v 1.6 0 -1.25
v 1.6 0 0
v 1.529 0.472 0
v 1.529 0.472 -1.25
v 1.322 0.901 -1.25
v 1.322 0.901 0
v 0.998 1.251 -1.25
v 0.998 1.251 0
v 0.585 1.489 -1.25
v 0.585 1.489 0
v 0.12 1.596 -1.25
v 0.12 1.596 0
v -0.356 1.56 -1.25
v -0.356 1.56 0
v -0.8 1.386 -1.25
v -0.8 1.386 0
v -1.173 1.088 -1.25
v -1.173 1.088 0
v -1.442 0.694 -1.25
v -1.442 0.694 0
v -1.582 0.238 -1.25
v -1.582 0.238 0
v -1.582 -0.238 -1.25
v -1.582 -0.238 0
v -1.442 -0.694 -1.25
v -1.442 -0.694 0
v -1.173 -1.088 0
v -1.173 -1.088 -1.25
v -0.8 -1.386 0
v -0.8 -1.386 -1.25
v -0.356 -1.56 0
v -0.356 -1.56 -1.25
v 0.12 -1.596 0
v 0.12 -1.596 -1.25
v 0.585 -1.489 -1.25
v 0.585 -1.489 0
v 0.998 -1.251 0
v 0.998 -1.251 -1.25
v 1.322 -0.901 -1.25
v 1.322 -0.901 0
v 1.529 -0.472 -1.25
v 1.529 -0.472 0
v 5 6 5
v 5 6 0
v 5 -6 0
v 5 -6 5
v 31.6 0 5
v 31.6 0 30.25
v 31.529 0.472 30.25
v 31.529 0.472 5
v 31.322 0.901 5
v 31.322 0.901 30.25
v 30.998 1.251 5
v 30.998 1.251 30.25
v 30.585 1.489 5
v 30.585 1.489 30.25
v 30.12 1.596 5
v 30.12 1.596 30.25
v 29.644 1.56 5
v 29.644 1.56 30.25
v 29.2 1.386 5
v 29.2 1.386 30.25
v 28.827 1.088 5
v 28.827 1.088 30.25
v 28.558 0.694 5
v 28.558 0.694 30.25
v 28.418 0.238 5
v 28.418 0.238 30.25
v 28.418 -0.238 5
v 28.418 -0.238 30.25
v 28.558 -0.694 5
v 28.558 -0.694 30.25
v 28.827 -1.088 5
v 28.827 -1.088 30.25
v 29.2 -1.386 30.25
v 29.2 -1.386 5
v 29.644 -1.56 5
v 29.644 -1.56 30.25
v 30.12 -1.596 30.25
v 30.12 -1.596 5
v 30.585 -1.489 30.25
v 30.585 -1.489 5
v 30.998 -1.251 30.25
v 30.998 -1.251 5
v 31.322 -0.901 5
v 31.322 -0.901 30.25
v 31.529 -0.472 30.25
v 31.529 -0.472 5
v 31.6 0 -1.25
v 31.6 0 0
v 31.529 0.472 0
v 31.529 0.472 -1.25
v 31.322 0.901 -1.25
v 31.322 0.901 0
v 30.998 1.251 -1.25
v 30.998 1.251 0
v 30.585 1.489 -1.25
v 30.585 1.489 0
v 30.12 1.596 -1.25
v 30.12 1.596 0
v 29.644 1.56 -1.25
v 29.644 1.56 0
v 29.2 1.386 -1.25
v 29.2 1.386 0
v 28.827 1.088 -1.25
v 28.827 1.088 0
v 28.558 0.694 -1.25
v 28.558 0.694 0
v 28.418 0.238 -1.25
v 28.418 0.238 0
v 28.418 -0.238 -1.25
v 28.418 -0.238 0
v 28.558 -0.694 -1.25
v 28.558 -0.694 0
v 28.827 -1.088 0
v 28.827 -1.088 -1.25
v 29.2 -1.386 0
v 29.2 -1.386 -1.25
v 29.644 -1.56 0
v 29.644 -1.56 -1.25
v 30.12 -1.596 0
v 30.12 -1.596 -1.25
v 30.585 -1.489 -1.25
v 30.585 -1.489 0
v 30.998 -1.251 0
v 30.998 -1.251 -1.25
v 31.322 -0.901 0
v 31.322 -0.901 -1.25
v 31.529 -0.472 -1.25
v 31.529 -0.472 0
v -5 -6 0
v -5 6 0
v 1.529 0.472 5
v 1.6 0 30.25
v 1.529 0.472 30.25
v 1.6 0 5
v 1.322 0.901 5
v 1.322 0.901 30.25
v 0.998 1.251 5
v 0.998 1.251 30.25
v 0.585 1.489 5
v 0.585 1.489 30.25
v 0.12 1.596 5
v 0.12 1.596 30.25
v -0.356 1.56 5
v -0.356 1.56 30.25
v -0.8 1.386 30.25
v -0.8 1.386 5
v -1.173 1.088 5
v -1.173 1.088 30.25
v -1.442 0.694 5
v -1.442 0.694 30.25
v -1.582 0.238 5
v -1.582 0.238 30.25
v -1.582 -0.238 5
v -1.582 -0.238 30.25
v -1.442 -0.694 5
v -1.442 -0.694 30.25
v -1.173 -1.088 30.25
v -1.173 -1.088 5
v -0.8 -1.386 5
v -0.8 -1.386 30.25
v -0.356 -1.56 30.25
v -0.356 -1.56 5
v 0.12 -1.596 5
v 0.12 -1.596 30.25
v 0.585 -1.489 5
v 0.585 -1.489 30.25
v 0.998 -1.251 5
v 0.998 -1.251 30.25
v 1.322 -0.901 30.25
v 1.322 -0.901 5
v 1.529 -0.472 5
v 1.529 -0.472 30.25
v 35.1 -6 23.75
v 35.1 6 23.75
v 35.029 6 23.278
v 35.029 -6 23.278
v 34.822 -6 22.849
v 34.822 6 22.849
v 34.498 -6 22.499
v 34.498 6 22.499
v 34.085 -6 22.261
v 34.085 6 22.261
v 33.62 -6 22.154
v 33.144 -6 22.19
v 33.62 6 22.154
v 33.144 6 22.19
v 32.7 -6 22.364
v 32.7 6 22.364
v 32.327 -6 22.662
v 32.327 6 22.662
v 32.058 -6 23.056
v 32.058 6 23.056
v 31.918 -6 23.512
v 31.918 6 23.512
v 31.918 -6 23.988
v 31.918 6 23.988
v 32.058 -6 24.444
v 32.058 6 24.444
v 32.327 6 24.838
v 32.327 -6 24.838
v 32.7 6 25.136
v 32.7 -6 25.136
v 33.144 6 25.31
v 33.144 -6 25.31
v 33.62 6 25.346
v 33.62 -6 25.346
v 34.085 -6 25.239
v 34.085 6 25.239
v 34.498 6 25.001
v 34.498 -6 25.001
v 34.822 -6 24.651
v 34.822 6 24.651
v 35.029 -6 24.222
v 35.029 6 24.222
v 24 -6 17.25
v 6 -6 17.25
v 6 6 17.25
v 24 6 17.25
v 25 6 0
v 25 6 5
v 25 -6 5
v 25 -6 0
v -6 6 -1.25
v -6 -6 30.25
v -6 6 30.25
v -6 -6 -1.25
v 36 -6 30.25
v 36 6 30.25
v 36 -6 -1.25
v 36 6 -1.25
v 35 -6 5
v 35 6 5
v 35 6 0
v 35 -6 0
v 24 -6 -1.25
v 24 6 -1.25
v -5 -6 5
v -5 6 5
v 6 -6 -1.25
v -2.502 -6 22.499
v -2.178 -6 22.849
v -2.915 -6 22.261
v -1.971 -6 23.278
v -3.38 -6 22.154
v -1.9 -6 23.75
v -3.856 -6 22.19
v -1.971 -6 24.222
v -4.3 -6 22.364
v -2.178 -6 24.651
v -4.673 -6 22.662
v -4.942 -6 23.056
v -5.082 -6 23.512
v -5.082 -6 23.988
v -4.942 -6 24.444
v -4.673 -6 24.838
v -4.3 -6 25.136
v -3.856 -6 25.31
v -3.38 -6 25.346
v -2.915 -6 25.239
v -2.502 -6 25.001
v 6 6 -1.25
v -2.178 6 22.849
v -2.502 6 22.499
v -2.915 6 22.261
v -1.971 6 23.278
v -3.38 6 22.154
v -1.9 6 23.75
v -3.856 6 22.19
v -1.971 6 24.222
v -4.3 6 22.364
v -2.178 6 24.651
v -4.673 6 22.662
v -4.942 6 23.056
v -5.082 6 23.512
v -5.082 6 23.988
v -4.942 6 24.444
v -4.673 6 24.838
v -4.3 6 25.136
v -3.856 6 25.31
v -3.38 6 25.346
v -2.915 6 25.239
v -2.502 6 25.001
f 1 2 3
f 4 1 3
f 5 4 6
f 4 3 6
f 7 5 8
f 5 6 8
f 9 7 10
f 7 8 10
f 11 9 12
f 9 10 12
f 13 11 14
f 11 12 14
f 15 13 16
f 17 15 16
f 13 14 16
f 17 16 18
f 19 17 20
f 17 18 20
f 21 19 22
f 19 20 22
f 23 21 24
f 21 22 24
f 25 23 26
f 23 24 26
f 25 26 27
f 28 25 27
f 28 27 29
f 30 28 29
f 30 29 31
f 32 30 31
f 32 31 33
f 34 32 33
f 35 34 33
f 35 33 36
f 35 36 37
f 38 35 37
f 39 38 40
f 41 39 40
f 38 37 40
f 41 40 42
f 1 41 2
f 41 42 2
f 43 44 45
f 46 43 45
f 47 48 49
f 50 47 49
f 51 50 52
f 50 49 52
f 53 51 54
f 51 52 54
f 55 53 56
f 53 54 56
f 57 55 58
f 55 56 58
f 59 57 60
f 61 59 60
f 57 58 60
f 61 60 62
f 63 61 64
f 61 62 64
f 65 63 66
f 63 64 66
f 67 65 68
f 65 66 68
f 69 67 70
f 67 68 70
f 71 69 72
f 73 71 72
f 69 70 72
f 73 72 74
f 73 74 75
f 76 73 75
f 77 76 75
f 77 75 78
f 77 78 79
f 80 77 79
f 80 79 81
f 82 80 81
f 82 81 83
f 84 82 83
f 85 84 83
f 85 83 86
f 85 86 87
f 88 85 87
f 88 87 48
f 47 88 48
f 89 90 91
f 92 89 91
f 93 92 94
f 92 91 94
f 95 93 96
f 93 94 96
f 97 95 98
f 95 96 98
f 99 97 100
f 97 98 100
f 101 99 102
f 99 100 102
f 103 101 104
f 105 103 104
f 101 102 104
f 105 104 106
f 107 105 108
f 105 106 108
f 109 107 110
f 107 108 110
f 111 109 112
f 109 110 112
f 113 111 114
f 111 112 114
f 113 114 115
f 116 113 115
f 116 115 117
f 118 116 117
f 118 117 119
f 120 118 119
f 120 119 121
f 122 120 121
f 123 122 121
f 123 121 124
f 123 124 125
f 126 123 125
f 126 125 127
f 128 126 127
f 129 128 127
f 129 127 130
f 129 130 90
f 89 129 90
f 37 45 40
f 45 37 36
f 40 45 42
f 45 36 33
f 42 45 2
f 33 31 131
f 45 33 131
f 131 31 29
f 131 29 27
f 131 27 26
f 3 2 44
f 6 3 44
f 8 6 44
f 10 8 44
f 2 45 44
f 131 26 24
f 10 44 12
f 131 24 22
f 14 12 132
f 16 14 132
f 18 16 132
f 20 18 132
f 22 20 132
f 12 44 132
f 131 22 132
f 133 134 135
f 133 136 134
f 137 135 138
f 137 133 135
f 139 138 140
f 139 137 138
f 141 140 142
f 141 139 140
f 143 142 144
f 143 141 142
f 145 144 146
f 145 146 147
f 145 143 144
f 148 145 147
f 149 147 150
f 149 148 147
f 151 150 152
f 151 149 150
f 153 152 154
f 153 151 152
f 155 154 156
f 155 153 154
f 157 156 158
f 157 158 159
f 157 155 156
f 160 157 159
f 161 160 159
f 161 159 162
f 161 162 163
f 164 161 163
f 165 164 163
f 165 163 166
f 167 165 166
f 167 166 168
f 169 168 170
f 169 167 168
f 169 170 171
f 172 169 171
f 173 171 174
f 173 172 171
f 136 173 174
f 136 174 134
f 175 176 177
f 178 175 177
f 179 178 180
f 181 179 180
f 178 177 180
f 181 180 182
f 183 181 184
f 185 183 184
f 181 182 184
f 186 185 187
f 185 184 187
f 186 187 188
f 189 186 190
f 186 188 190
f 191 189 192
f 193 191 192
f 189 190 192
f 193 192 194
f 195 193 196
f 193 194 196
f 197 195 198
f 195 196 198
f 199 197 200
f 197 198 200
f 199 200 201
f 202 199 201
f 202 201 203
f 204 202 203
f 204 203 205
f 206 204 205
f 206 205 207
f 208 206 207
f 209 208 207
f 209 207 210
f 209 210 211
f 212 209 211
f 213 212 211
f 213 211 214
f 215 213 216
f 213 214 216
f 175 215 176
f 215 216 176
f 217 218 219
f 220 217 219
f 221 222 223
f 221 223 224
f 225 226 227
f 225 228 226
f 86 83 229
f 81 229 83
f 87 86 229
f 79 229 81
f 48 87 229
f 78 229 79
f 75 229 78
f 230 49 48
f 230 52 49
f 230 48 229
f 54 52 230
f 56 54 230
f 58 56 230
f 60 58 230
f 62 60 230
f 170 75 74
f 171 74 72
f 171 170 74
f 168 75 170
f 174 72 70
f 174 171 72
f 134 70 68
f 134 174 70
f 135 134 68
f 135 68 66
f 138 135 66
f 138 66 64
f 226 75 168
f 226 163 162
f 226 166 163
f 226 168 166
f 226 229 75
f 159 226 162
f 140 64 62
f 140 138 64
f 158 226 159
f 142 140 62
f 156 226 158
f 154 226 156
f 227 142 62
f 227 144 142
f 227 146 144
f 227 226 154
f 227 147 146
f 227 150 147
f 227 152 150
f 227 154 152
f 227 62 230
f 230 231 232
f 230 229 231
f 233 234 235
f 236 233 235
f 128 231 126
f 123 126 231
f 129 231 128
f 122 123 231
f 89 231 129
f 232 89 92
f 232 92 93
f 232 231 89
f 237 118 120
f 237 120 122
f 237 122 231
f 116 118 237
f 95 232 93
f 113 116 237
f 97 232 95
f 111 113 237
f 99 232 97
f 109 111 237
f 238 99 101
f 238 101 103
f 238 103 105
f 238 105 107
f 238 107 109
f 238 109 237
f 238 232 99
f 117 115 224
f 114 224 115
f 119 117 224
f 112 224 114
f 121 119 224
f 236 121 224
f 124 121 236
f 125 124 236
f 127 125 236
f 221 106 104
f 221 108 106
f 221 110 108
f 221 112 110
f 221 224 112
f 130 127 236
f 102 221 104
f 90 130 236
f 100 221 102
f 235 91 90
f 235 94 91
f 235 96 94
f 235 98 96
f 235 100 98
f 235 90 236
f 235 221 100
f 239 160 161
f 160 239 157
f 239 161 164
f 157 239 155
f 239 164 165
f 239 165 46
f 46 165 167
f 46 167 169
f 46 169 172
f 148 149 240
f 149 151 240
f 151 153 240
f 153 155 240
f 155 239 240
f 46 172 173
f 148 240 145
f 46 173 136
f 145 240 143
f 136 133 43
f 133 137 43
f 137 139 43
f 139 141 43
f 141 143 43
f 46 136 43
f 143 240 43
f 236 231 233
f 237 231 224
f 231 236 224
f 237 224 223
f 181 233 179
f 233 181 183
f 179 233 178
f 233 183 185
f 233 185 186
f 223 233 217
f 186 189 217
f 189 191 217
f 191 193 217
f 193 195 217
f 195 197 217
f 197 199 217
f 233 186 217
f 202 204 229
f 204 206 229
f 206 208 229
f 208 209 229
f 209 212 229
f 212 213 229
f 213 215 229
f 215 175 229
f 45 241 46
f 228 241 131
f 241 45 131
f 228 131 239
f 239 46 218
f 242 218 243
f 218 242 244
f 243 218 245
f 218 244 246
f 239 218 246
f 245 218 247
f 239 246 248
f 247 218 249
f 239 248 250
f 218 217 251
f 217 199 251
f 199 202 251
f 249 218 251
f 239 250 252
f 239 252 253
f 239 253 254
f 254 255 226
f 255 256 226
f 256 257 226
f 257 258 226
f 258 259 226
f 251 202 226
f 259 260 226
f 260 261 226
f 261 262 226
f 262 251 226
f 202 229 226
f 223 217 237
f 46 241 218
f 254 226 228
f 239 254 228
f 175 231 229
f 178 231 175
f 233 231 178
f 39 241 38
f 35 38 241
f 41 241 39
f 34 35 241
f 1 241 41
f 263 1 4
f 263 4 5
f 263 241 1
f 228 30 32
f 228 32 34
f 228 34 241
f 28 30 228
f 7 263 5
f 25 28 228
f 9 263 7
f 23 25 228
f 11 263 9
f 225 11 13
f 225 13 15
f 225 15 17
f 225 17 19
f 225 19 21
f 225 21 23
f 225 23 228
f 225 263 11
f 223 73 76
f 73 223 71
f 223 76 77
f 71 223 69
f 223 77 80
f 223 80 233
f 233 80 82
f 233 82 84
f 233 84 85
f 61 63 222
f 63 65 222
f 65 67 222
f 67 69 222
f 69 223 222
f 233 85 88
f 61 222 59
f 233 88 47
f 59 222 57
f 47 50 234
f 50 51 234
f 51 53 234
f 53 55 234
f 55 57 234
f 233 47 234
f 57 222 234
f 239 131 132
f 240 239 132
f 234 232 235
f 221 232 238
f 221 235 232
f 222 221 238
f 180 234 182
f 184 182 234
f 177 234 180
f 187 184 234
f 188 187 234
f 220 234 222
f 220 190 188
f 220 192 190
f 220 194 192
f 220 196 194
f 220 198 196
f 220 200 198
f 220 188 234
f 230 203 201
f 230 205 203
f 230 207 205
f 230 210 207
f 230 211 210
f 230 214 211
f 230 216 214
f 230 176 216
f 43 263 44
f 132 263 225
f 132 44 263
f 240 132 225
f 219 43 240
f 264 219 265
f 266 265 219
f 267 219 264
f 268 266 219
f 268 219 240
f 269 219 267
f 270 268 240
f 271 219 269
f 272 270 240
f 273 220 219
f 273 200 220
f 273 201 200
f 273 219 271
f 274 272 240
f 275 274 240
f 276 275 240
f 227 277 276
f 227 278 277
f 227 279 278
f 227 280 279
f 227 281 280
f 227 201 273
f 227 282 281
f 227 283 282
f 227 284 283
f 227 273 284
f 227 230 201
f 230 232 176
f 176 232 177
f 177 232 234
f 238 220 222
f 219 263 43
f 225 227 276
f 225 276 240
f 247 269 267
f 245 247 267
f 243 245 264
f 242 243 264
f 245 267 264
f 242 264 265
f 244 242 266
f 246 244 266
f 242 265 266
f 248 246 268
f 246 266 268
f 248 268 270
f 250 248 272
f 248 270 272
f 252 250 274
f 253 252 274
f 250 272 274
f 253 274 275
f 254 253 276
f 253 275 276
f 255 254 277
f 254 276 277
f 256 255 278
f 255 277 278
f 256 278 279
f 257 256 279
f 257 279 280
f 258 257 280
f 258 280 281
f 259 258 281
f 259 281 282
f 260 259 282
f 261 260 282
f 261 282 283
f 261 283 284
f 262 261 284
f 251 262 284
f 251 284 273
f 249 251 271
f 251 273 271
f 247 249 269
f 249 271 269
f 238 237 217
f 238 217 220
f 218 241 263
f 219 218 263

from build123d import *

# Parameters (mm, degrees)
SALIENTE_EXTRUIR1_DEPTH   = 5
SALIENTE_EXTRUIR1_2_DEPTH = 5
CROQUIS3_W                = 12
CROQUIS3_H                = 12
SALIENTE_EXTRUIR2_DEPTH   = 1.25
CROQUIS4_W                = 12
CROQUIS4_H                = 12
SALIENTE_EXTRUIR3_DEPTH   = 1.25
CROQUIS5_R                = 1.6
CORTAR_EXTRUIR1_DEPTH     = 1.25
CROQUIS9_R                = 1.6
CORTAR_EXTRUIR2_DEPTH     = 1.25
CROQUIS11_W               = 12
CROQUIS11_H               = 12
CROQUIS11_R               = 1.6
SALIENTE_EXTRUIR4_DEPTH   = 24
CROQUIS13_W               = 13
CROQUIS13_H               = 12
SALIENTE_EXTRUIR6_DEPTH   = 30
CROQUIS14_W               = 12
CROQUIS14_H               = 12
SALIENTE_EXTRUIR8_DEPTH   = 18.5
CROQUIS15_W               = 10
CROQUIS15_H               = 5
CORTAR_EXTRUIR3_DEPTH     = 12
CROQUIS16_R               = 1.6
CORTAR_EXTRUIR5_DEPTH     = 32
CROQUIS17_R               = 1.6
CORTAR_EXTRUIR6_DEPTH     = 12


with BuildPart() as part:
    # Croquis2 → Saliente-Extruir1 (new body)
    with BuildSketch(Plane.XY):
        Polygon((-5, -6), (-5, -5), (-5, 5), (-5, 6), (-6, 6), (-6, 5), (-6, -6), align=None)
    extrude(amount=SALIENTE_EXTRUIR1_DEPTH)



with BuildPart() as body_2:
    # Croquis2 → Saliente-Extruir1 2 (new body)
    with BuildSketch(Plane.XY):
        Polygon((5, 5), (5, -5), (5, -6), (6, -6), (6, 6), (5, 6), align=None)
    extrude(amount=SALIENTE_EXTRUIR1_2_DEPTH)


with BuildPart() as part_1:
    add(part.part)

    add(body_2.part)  # Saliente-Extruir2 merges body 2
    # Croquis3 → Saliente-Extruir2 (add)
    with BuildSketch(Plane(origin=(0, 0, 0), x_dir=(-1, 0, 0), z_dir=(0, 0, -1))):
        Rectangle(CROQUIS3_W, CROQUIS3_H)
    extrude(amount=SALIENTE_EXTRUIR2_DEPTH)

    # Croquis4 → Saliente-Extruir3 (add)
    with BuildSketch(Plane.XY.offset(5)):
        Rectangle(CROQUIS4_W, CROQUIS4_H)
    extrude(amount=SALIENTE_EXTRUIR3_DEPTH)

    # Croquis5 → Cortar-Extruir1 (cut)
    with BuildSketch(Plane.XY.offset(6.25)):
        Circle(CROQUIS5_R)
    extrude(amount=-CORTAR_EXTRUIR1_DEPTH, mode=Mode.SUBTRACT)

    # Croquis9 → Cortar-Extruir2 (cut)
    with BuildSketch(Plane.XY):
        Circle(CROQUIS9_R)
    extrude(amount=-CORTAR_EXTRUIR2_DEPTH, mode=Mode.SUBTRACT)

    # Croquis11 → Saliente-Extruir4 (add)
    with BuildSketch(Plane.XY.offset(6.25)):
        Rectangle(CROQUIS11_W, CROQUIS11_H)
        Circle(CROQUIS11_R, mode=Mode.SUBTRACT)
    extrude(amount=SALIENTE_EXTRUIR4_DEPTH)

    # Croquis13 → Saliente-Extruir6 (add)
    with BuildSketch(Plane(origin=(6, 0, 0), x_dir=(0, 0, -1), z_dir=(1, 0, 0))):
        with Locations((-23.75, 0)):
            Rectangle(CROQUIS13_W, CROQUIS13_H)
    extrude(amount=SALIENTE_EXTRUIR6_DEPTH)

    # Croquis14 → Saliente-Extruir8 (add)
    with BuildSketch(Plane(origin=(0, 0, 17.25), x_dir=(-1, 0, 0), z_dir=(0, 0, -1))):
        with Locations((-30, 0)):
            Rectangle(CROQUIS14_W, CROQUIS14_H)
    extrude(amount=SALIENTE_EXTRUIR8_DEPTH)

    # Croquis15 → Cortar-Extruir3 (cut)
    with BuildSketch(Plane(origin=(0, 6, 0), x_dir=(1, 0, 0), z_dir=(0, 1, 0))):
        with Locations((30, -2.5)):
            Rectangle(CROQUIS15_W, CROQUIS15_H)
    extrude(amount=-CORTAR_EXTRUIR3_DEPTH, mode=Mode.SUBTRACT)

    # Croquis16 → Cortar-Extruir5 (cut)
    with BuildSketch(Plane.XY.offset(30.25)):
        Circle(CROQUIS16_R)
        with Locations((30, 0)):
            Circle(CROQUIS16_R)
    extrude(amount=-CORTAR_EXTRUIR5_DEPTH, mode=Mode.SUBTRACT)

    # Croquis17 → Cortar-Extruir6 (cut)
    with BuildSketch(Plane(origin=(0, 6, 0), x_dir=(1, 0, 0), z_dir=(0, 1, 0))):
        with Locations((-3.5, -23.75)):
            Circle(CROQUIS17_R)
        with Locations((33.5, -23.75)):
            Circle(CROQUIS17_R)
    extrude(amount=-CORTAR_EXTRUIR6_DEPTH, mode=Mode.SUBTRACT)


solid = part_1.part
